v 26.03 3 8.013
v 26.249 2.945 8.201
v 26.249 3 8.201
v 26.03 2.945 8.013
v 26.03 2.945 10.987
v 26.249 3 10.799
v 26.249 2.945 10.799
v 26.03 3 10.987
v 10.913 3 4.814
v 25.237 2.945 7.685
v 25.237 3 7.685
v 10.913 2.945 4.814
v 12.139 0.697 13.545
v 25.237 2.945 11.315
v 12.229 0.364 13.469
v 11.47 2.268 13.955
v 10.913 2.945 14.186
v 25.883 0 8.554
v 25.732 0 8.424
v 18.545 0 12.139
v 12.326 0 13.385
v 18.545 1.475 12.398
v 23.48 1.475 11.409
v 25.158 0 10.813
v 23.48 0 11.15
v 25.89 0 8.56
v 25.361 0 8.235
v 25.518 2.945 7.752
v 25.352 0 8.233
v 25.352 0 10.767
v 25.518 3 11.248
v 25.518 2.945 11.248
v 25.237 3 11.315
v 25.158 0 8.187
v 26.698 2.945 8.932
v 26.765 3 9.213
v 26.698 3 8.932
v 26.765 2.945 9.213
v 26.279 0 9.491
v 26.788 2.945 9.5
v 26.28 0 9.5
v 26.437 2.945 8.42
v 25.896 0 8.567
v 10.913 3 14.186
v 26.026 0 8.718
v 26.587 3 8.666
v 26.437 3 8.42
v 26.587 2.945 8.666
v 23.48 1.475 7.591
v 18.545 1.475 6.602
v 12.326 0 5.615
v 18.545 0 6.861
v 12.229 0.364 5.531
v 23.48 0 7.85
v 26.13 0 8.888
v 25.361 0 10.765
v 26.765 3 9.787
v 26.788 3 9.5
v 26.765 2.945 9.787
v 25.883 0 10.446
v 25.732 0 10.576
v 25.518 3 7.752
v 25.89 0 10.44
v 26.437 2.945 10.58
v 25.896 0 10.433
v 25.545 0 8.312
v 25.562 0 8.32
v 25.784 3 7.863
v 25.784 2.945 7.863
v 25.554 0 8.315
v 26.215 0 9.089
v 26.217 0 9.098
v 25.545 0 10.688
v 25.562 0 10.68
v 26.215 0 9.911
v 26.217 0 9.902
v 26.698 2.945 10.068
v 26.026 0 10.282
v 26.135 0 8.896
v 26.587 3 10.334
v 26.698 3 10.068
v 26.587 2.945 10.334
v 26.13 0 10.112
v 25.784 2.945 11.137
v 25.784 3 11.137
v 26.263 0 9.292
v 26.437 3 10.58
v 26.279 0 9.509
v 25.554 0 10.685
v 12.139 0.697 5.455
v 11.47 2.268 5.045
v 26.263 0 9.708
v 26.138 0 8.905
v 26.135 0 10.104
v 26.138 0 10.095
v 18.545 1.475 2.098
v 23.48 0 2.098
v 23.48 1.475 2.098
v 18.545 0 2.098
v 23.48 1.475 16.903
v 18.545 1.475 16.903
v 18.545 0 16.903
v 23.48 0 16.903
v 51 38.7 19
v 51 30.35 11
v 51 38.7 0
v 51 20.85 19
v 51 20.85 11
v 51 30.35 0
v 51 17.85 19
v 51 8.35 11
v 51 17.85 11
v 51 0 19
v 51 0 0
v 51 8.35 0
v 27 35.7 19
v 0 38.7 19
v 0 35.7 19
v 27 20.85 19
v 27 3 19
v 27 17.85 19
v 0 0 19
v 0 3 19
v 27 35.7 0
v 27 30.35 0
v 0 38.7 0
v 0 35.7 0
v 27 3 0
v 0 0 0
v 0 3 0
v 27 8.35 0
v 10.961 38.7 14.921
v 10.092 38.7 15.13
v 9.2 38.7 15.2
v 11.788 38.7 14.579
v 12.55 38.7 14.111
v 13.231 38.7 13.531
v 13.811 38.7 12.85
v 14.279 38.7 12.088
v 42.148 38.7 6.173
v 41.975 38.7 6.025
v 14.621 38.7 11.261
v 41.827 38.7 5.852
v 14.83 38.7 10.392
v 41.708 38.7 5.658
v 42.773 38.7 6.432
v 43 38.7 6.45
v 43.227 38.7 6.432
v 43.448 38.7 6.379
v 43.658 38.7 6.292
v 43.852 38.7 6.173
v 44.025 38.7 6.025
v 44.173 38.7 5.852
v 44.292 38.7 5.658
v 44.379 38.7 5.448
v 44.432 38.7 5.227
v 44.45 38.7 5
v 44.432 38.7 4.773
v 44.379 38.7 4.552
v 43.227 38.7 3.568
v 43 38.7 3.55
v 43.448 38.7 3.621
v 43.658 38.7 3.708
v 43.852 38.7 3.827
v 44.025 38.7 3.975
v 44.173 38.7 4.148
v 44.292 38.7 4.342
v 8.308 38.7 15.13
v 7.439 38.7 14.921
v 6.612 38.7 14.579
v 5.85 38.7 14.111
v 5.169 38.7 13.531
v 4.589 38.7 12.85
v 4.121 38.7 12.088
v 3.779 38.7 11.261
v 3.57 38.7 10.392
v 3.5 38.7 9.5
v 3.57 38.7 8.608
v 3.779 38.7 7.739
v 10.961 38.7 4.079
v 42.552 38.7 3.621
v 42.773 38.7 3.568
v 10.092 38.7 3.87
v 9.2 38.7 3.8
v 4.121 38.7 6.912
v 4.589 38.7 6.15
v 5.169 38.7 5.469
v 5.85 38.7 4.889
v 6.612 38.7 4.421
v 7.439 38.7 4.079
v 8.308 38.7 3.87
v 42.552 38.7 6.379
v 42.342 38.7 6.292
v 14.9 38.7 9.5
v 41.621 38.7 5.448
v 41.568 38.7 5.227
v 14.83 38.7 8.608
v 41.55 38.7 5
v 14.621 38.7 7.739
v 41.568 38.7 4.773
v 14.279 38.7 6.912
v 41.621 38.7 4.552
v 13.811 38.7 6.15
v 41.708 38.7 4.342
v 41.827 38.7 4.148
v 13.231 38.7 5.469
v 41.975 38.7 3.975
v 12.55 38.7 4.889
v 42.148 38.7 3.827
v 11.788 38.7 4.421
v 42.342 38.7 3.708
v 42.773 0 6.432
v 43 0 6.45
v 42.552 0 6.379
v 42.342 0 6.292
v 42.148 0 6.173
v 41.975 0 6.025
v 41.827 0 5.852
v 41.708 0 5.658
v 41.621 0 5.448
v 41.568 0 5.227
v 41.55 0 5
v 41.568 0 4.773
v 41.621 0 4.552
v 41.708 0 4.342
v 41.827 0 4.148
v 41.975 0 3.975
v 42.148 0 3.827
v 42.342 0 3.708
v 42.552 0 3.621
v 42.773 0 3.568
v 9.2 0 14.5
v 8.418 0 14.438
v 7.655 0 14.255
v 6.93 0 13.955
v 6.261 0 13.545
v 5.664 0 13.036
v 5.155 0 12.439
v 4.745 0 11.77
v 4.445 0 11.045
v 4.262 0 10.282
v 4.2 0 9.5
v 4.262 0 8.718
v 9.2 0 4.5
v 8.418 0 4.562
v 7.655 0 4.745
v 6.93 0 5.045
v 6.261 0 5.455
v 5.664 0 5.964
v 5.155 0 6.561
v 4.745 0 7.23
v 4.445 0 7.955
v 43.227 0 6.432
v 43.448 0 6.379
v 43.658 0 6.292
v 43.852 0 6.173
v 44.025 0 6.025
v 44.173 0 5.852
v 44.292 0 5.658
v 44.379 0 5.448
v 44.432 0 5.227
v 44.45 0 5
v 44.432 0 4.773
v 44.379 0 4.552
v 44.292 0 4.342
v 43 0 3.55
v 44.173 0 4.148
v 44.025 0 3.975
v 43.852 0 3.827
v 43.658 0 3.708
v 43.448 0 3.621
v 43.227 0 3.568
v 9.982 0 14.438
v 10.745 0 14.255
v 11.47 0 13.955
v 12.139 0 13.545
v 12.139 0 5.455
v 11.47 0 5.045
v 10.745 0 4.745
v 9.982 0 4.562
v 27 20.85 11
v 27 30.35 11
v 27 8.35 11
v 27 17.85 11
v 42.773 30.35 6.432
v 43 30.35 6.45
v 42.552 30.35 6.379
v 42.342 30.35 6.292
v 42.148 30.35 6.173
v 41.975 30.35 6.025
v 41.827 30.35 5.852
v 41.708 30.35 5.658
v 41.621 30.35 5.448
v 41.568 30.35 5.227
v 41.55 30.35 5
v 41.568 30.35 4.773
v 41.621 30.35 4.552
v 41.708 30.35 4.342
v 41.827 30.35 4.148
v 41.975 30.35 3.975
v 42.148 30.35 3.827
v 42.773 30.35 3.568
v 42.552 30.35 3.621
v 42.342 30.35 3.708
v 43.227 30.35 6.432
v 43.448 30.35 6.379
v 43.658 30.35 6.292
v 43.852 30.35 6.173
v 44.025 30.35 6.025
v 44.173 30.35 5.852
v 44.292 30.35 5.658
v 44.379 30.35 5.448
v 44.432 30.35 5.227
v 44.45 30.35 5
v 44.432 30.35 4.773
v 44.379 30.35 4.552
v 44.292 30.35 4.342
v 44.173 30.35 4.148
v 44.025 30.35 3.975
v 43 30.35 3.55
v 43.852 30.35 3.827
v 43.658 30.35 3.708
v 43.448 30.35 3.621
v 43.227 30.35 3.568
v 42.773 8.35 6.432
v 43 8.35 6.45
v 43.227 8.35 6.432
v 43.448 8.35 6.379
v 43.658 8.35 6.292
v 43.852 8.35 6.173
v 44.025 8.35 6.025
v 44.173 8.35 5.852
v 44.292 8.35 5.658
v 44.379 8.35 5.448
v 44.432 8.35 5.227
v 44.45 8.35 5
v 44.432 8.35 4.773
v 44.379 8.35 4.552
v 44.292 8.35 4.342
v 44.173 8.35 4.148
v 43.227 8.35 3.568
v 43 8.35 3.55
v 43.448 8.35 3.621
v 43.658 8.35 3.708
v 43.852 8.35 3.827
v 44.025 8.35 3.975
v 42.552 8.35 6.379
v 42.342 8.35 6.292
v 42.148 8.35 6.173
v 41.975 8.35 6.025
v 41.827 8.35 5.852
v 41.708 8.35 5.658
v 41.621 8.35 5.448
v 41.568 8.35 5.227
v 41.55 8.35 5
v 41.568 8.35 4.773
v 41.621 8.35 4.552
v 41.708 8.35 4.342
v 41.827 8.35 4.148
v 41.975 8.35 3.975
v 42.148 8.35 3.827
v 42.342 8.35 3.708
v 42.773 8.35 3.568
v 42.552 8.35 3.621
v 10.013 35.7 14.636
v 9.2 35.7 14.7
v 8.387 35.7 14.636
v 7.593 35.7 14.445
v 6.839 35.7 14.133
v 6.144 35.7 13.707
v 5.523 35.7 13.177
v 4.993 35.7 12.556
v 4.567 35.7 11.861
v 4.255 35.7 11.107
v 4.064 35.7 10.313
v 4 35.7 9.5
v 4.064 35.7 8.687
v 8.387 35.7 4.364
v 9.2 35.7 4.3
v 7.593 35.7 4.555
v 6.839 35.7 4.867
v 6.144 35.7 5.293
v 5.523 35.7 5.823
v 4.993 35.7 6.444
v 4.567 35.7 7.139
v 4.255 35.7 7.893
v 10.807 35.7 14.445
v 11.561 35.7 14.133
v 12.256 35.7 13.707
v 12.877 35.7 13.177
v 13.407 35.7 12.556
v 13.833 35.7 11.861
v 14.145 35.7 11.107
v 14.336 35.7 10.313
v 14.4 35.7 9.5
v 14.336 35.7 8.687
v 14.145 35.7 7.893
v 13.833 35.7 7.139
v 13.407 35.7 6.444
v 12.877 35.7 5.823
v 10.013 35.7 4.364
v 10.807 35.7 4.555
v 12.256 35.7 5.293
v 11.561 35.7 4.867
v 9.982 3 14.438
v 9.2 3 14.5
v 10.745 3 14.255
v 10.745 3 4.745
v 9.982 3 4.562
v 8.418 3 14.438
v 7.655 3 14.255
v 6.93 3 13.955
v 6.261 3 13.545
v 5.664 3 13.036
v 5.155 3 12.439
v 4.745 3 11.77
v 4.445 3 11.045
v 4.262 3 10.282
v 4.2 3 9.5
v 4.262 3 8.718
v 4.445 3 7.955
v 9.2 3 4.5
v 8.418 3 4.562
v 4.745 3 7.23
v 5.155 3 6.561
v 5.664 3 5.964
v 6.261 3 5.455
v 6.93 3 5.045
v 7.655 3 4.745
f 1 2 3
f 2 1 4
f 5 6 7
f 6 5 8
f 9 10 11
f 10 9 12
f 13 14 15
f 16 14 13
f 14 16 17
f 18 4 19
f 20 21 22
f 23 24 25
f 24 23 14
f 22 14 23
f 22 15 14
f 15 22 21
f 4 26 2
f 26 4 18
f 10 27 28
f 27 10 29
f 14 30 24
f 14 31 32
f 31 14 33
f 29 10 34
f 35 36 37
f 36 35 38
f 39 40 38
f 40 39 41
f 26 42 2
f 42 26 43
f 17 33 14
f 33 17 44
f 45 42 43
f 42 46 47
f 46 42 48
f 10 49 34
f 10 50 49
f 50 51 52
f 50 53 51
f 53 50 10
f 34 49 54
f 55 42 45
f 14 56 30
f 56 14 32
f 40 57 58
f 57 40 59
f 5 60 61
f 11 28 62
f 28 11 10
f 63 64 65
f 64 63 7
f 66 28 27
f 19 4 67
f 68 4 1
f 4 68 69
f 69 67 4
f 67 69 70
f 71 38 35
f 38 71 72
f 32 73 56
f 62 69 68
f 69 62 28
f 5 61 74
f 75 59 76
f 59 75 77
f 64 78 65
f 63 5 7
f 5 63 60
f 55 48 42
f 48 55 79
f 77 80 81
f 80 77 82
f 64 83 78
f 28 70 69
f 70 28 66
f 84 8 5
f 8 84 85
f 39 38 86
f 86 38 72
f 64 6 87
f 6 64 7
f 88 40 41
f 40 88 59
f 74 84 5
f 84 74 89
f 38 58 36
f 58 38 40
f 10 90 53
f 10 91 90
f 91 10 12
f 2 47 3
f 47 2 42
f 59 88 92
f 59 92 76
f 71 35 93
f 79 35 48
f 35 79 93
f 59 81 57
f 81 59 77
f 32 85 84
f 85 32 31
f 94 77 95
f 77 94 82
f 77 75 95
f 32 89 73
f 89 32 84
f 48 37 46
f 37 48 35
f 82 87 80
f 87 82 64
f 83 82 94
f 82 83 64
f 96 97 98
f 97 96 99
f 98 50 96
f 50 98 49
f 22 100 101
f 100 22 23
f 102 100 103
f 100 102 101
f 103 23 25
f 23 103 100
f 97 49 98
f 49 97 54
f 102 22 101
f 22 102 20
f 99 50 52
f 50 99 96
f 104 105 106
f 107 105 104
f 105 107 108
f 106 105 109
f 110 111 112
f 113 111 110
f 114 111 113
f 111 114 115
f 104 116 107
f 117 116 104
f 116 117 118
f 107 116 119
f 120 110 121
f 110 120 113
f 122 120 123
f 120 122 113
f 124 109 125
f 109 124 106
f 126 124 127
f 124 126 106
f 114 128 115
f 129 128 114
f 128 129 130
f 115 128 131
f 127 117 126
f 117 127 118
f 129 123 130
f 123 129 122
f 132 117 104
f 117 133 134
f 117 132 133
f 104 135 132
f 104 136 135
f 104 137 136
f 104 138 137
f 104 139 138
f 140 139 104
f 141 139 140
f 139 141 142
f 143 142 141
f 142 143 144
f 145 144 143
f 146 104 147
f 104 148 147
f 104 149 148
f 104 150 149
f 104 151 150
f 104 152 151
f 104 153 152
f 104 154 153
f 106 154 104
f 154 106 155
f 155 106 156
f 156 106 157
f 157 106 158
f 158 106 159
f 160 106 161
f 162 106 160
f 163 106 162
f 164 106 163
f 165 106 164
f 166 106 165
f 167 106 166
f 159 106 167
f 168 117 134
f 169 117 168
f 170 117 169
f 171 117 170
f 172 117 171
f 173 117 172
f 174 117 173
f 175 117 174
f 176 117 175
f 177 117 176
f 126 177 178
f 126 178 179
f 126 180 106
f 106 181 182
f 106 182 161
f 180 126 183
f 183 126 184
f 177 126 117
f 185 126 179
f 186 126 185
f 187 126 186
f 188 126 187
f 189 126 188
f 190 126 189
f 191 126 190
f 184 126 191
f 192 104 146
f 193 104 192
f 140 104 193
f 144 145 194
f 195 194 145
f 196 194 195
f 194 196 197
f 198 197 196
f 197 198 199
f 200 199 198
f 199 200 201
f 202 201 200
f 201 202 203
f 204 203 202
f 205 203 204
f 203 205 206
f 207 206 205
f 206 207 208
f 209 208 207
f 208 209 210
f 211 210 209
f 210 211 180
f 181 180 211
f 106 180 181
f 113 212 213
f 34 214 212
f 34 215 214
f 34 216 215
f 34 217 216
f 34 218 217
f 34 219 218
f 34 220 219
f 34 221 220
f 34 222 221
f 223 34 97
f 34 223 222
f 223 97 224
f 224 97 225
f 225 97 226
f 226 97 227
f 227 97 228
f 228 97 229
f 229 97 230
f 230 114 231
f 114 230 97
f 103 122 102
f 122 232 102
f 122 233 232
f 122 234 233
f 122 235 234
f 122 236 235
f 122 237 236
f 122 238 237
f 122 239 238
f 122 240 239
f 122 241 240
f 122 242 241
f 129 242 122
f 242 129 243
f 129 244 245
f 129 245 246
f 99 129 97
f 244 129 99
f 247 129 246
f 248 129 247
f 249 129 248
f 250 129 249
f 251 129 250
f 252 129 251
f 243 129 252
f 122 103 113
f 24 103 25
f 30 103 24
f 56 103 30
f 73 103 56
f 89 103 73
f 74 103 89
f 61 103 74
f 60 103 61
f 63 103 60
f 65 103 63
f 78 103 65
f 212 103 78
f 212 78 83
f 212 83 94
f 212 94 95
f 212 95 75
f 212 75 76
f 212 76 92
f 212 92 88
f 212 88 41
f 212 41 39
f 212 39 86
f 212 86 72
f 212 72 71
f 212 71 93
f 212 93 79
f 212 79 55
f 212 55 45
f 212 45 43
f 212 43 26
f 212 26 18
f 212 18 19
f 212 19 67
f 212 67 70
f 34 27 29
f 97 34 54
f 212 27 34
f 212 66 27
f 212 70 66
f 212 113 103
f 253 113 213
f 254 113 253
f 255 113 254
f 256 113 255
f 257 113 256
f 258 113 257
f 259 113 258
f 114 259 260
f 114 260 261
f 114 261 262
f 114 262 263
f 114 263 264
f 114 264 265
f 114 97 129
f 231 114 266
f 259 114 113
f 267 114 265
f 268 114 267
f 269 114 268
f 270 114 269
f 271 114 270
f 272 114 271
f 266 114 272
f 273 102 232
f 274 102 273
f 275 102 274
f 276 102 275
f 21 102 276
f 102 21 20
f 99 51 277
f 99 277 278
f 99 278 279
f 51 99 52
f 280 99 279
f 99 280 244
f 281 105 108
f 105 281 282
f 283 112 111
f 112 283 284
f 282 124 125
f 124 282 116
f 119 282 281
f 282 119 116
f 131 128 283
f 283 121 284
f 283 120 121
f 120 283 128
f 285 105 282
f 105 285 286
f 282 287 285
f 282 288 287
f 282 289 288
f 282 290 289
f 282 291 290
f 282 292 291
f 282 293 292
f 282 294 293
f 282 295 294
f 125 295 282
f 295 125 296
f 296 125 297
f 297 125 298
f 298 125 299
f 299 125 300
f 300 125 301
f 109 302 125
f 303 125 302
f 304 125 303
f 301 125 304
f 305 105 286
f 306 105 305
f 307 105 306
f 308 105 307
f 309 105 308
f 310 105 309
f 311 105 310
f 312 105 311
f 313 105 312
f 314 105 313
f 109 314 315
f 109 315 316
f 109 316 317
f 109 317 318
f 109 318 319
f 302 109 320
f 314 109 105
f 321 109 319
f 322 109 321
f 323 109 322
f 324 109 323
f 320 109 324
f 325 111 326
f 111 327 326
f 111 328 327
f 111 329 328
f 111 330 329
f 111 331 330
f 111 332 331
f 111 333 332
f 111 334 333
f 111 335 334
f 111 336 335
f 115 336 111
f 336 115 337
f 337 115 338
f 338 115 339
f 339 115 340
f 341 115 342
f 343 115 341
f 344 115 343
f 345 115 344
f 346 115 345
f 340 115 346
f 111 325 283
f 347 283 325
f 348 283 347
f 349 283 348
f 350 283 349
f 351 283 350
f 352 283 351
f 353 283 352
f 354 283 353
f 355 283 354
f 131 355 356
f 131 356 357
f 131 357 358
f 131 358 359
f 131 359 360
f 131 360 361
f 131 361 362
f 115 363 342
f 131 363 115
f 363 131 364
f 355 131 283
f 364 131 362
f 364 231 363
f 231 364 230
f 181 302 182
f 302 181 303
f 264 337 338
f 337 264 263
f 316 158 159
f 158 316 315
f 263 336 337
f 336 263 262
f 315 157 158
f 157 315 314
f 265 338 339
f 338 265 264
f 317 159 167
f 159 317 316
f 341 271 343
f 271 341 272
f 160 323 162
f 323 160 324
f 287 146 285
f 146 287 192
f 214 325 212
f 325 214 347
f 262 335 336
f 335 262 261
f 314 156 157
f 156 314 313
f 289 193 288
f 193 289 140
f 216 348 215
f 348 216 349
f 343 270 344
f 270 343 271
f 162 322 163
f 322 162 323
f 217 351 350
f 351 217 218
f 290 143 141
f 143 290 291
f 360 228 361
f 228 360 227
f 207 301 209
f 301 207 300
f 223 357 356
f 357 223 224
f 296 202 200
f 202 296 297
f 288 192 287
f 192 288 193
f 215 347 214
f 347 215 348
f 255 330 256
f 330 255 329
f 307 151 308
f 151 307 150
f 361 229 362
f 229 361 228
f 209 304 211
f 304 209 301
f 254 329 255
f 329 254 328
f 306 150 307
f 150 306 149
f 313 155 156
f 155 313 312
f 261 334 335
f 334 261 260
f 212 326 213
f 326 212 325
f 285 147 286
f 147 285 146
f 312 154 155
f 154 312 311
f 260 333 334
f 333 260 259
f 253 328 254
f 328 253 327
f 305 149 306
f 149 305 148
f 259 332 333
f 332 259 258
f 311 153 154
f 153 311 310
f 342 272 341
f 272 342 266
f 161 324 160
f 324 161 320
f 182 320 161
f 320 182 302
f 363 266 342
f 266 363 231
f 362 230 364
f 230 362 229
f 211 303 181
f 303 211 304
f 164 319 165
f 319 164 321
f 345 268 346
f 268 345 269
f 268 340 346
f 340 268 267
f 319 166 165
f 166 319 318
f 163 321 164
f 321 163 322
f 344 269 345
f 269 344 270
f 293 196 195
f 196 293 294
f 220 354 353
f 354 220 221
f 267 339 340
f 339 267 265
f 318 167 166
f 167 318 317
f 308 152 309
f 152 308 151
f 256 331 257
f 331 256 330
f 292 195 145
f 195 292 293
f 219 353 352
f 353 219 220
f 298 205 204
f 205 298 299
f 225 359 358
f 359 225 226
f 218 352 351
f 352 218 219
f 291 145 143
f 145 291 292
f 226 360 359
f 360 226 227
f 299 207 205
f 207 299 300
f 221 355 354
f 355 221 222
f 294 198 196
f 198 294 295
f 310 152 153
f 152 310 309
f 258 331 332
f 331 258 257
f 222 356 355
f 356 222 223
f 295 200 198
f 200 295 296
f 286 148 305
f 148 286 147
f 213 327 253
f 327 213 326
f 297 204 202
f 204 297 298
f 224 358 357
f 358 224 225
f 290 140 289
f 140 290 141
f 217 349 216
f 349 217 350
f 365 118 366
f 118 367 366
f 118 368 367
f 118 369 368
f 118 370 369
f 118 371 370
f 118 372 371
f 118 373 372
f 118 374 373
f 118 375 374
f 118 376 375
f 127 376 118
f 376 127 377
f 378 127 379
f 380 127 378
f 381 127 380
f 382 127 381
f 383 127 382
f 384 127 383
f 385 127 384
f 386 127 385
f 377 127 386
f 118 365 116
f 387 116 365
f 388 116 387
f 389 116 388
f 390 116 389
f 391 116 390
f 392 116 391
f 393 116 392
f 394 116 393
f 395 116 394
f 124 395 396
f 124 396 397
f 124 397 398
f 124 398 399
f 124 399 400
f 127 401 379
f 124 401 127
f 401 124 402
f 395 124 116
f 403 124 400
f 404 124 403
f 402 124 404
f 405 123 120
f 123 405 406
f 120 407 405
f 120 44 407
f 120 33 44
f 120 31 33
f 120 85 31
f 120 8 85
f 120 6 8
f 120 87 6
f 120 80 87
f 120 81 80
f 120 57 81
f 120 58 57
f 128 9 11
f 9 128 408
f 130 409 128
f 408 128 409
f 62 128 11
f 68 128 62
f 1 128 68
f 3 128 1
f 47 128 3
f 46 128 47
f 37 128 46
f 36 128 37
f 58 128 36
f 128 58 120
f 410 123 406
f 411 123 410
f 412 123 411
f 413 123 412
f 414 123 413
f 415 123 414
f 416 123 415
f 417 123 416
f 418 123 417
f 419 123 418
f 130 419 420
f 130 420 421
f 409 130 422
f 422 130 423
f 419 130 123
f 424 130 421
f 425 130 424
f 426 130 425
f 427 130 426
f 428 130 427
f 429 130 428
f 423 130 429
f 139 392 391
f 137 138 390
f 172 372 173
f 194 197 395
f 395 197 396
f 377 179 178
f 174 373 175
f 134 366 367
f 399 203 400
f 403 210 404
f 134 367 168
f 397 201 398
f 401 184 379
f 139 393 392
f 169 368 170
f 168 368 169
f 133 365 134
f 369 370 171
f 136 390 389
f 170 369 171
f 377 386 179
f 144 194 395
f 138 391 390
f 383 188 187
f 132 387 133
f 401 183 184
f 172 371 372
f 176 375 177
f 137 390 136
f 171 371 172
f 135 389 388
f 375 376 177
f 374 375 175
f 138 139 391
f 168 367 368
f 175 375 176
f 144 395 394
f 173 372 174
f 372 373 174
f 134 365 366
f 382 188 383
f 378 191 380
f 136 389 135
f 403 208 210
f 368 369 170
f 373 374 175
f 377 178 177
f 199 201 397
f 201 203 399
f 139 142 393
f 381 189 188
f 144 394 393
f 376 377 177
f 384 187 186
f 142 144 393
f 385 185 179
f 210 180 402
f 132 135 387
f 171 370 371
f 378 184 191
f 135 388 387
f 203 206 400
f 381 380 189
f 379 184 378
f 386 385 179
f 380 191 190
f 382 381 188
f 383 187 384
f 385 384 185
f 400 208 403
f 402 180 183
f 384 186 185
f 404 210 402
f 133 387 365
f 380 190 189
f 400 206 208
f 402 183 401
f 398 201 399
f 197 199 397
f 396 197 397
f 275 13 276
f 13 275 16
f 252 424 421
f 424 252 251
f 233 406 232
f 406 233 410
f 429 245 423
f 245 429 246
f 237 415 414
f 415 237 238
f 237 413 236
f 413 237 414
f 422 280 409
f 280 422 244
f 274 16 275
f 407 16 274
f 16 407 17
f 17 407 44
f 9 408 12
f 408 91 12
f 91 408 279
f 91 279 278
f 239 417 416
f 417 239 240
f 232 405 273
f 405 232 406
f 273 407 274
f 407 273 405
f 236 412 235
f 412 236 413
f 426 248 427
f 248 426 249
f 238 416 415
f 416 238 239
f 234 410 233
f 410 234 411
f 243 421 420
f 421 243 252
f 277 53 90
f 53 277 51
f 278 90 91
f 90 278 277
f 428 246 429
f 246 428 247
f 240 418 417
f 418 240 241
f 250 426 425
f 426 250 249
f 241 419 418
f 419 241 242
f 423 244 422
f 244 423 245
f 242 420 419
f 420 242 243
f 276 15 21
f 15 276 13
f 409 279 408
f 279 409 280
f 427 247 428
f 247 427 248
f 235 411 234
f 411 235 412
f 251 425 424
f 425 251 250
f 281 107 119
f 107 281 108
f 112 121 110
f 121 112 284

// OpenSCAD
// file: servo_arm.scad
/**
 *  Parametric servo arm generator for OpenScad
 *  Générateur de palonnier de servo pour OpenScad
 *
 *  Copyright (c) 2012 Charles Rincheval.  All rights reserved.
 *
 *  This library is free software; you can redistribute it and/or
 *  modify it under the terms of the GNU Lesser General Public
 *  License as published by the Free Software Foundation; either
 *  version 2.1 of the License, or (at your option) any later version.
 *
 *  This library is distributed in the hope that it will be useful,
 *  but WITHOUT ANY WARRANTY; without even the implied warranty of
 *  MERCHANTABILITY or FITNESS FOR A PARTICULAR PURPOSE.  See the GNU
 *  Lesser General Public License for more details.
 *
 *  You should have received a copy of the GNU Lesser General Public
 *  License along with this library; if not, write to the Free Software
 *  Foundation, Inc., 51 Franklin St, Fifth Floor, Boston, MA  02110-1301  USA
 *
 *  Last update :
 *  https://github.com/hugokernel/OpenSCAD_ServoArms
 *
 *  http://www.digitalspirit.org/
 */

arm_length = 20;

arm_count = 4; // [1,2,3,4,5,6,7,8]

//  Clear between arm head and servo head (PLA: 0.3, ABS 0.2)
SERVO_HEAD_CLEAR = 0.2; // [0.2,0.3,0.4,0.5]

$fn = 40 / 1;

/**
 *  Head / Tooth parameters
 *  Futaba 3F Standard Spline
 *  http://www.servocity.com/html/futaba_servo_splines.html
 *
 *  First array (head related) :
 *  0. Head external diameter
 *  1. Head heigth
 *  2. Head thickness
 *  3. Head screw diameter
 *
 *  Second array (tooth related) :
 *  0. Tooth count
 *  1. Tooth height
 *  2. Tooth length
 *  3. Tooth width
 */
FUTABA_3F_SPLINE = [
    [5.92, 4, 1.1, 2.5],
    [25, 0.3, 0.7, 0.1]
];

module servo_futaba_3f(length, count) {
    servo_arm(FUTABA_3F_SPLINE, [length, count]);
}

/**
 *  If you want to support a new servo, juste add a new spline definition array
 *  and a module named like servo_XXX_YYY where XXX is servo brand and YYY is the
 *  connection type (3f) or the servo type (s3003)
 */

module servo_standard(length, count) {
    servo_futaba_3f(length, count);
}

/**
 *  Tooth
 *
 *    |<-w->|
 *    |_____|___
 *    /     \  ^h
 *  _/       \_v
 *   |<--l-->|
 *
 *  - tooth length (l)
 *  - tooth width (w)
 *  - tooth height (h)
 *  - height
 *
 */
module servo_head_tooth(length, width, height, head_height) {
    linear_extrude(height = head_height) {
        polygon([[-length / 2, 0], [-width / 2, height], [width / 2, height], [length / 2,0]]);
    }
}

/**
 *  Servo head
 */
module servo_head(params, clear = SERVO_HEAD_CLEAR) {

    head = params[0];
    tooth = params[1];

    head_diameter = head[0];
    head_heigth = head[1];

    tooth_count = tooth[0];
    tooth_height = tooth[1];
    tooth_length = tooth[2];
    tooth_width = tooth[3];

    % cylinder(r = head_diameter / 2, h = head_heigth + 1);

    cylinder(r = head_diameter / 2 - tooth_height + 0.03 + clear, h = head_heigth);

    for (i = [0 : tooth_count]) {
        rotate([0, 0, i * (360 / tooth_count)]) {
            translate([0, head_diameter / 2 - tooth_height + clear, 0]) {
                servo_head_tooth(tooth_length, tooth_width, tooth_height, head_heigth);
            }
        }
    }
}

/**
 *  Servo hold
 *  - Head / Tooth parameters
 *  - Arms params (length and count)
 */
module servo_arm(params, arms) {

    head = params[0];
    tooth = params[1];

    head_diameter = head[0];
    head_heigth = head[1];
    head_thickness = head[2];
    head_screw_diameter = head[3];

    tooth_length = tooth[2];
    tooth_width = tooth[3];

    arm_length = arms[0];
    arm_count = arms[1];

    /**
     *  Servo arm
     *  - length is from center to last hole
     */
    module arm(tooth_length, tooth_width, head_height, head_heigth, hole_count = 1) {

        arm_screw_diameter = 2;

        difference() {
            union() {
                cylinder(r = tooth_width / 2, h = head_heigth);

                linear_extrude(height = head_heigth) {
                    polygon([
                        [-tooth_width / 2, 0], [-tooth_width / 3, tooth_length],
                        [tooth_width / 3, tooth_length], [tooth_width / 2, 0]
                    ]);
                }

                translate([0, tooth_length, 0]) {
                    cylinder(r = tooth_width / 3, h = head_heigth);
                }

                if (tooth_length >= 12) {
                    translate([-head_heigth / 2 + 2, 3.8, -4]) {
                        rotate([90, 0, 0]) {
                            rotate([0, -90, 0]) {
                                linear_extrude(height = head_heigth) {
                                    polygon([
                                        [-tooth_length / 1.7, 4], [0, 4], [0, - head_height + 5],
                                        [-2, - head_height + 5]
                                    ]);
                                }
                            }
                        }
                    }
                }
            }

            // Hole
            for (i = [0 : hole_count - 1]) {
                //translate([0, length - (length / hole_count * i), -1]) {
                translate([0, tooth_length - (4 * i), -1]) {
                    cylinder(r = arm_screw_diameter / 2, h = 10);
                }
            }

            cylinder(r = head_screw_diameter / 2, h = 10);
        }
    }

    difference() {
        translate([0, 0, 0.1]) {
            cylinder(r = head_diameter / 2 + head_thickness, h = head_heigth + 1);
        }

        cylinder(r = head_screw_diameter / 2, h = 10);

        servo_head(params);
    }

    arm_thickness = head_thickness;

    // Arm
    translate([0, 0, head_heigth]) {
        for (i = [0 : arm_count - 1]) {
            rotate([0, 0, i * (360 / arm_count)]) {
                arm(arm_length, head_diameter + arm_thickness * 2, head_heigth, 2);
            }
        }
    }
}

module demo() {
    rotate([0, 180, 0])
        servo_standard(arm_length, arm_count);
}

//demo();
//servo_standard(arm_length, 1);
// main file
$fn=128;

include <servo_arm.scad>;

//Servo actuator joint
//TODO: Cleanly break out user variables

Servo_Base_X=24;
Servo_Base_Y=13;
Servo_Base_Z=5.5;
Servo_Gear=5/2;
Servo_Height=32.7; //Alter this with total Servo Height
//Servo_ToMount=(4.4)+15.8; //Alter this last amt to adj servo height //Blue Plastic
Servo_ToMount=(4.4)+18.6; //Alter this last amt to adj servo height //Metal
Connector_Width=10;
Connector_Height=4;
Height_To_Wire=5.5;
Servo_Screw_Offset=2;
Servo_Mount_Screw_Rad=1.9/2;
Servo_Mount_Screw_Height=10;
Depth_To_Cog=10;

M3_HeadHeight=3;
M3_HeadDia=5.75;
M3_Length=[7, 8.75, 14.61, 17, 17.75, 19, 22.79, 25.21, 32.75];
M3_ScrewDia=2.9;

//Arm
Servo_Arm_Gear_Dia=7.5;
Servo_Arm_Tip_Dia=3.5;
Servo_Arm_Length=15;
Arm_Thickness=3;
Arm_Width=(Servo_Base_X+9)*2+Servo_Height+5;
Servo_Arm_Plus_Length=10;
Servo_Arm_Plus_Width=4;
Servo_Arm_Offset=-2;
echo("Arm Width: ", Arm_Width);

Clip_Allowance=.5;

//servo head
FUTABA_3F_SPLINE = [
    [4.7, 4, 1.1, 2.5],
    [20, 0.3, 0.7, 0.1]
];

module ServoHead() {
    head_round=FUTABA_3F_SPLINE[0][0];
    difference() {
        union() {
            difference() {
                //servo spline match
                cylinder(r=head_round, h=7-Arm_Thickness);
                servo_head(FUTABA_3F_SPLINE);
            }
            hull() {
                hull() {
                    translate([0,0,7-Arm_Thickness]) cylinder(r=head_round, h=.1);
                    translate([0,Servo_Arm_Length, 7-Arm_Thickness]) cylinder(r=Servo_Arm_Tip_Dia/2, h=.1);
                }
                hull() {
                    translate([0,0,7-0.1]) cylinder(r=head_round-.5, h=.1);
                    translate([0,Servo_Arm_Length, 7-0.1]) cylinder(r=Servo_Arm_Tip_Dia/2-.5, h=.1);
                }
            }
            translate([0,Servo_Arm_Length*.75,7-.75]) cube([head_round*3, head_round, 1.5], center=true); 
        }
        cylinder(r=1.5, h=7);
        translate([0,0,7-1.5]) cylinder(r=3, h=7);
    }
}

module MountClip() {
    difference() {
        cube([Servo_Base_X+14, Servo_Base_Y+12, Servo_ToMount-4.4]);
        difference() {
            //take out the servo-seat
            translate([2-.4, (Servo_Base_Y+12)/2-(Servo_Base_Y+4+Clip_Allowance)/2, 0]) cube([Servo_Base_X+10+Clip_Allowance, Servo_Base_Y+4+Clip_Allowance, Servo_ToMount-4+Clip_Allowance]);
            //some side knotches for stability
            echo ((Servo_Base_Y+12)/2+(Servo_Base_Y+4+Clip_Allowance)/2-1);
            translate([((Servo_Base_X+11+Clip_Allowance*2)/3)+2-Clip_Allowance, (Servo_Base_Y+12)/2+(Servo_Base_Y+4+Clip_Allowance)/2-1, 0]) cube([((Servo_Base_X+10)/3)-Clip_Allowance*2, 1, Servo_ToMount-6-Clip_Allowance*2]);
            translate([((Servo_Base_X+11+Clip_Allowance*2)/3)+(2-Clip_Allowance), (Servo_Base_Y+12)/2-(Servo_Base_Y+4+Clip_Allowance)/2 , 0]) cube([((Servo_Base_X+10)/3)-Clip_Allowance*2, 1, Servo_ToMount-6-Clip_Allowance*2]);
        }
        //Open up the front
        translate([0, (Servo_Base_Y+12)/2-(Servo_Base_Y+4+Clip_Allowance-4)/2, 0]) cube([2, Servo_Base_Y+4+Clip_Allowance-4, Servo_ToMount-4+Clip_Allowance]);
        //screw Holes
        translate([4.5, Servo_Base_Y+12+Clip_Allowance, Servo_ToMount-8]) rotate([-90,0,0]) M3Screw(0);
        translate([4.5, -Clip_Allowance, Servo_ToMount-8]) rotate([90,0,0]) M3Screw(0);
        translate([Servo_Base_X+9-M3_ScrewDia/2-1+2-.4,Servo_Base_Y+12+Clip_Allowance, 7-4]) rotate([-90,0,0]) M3Screw(0);
        translate([Servo_Base_X+9-M3_ScrewDia/2-1+2-Clip_Allowance,-Clip_Allowance, 7-4]) rotate([90,0,0]) M3Screw(0);
    }
}

module M3Screw(num) {
    translate([0,0,-M3_Length[num]]) union() {
        translate([0,0,M3_Length[num]-M3_HeadHeight]) cylinder(r=M3_HeadDia/2, h=M3_HeadHeight);
        translate([0,0,0]) cylinder(r=M3_ScrewDia/2, h=M3_Length[num]);
    }
}

module MountBox() { 
    difference() {
        cube([Servo_Base_X+9, Servo_Base_Y+4, Servo_Height+6]);
        //take the middle out to fix servo
        hull() {
            translate([5,2,Servo_Height-2]) cube([Servo_Base_X, Servo_Base_Y, 2]);
            translate([5,2,3]) cube([Servo_Base_X-1, Servo_Base_Y, 2]);
        }
        //Take the top off
        translate([0,0,Servo_ToMount]) cube([Servo_Base_X+10, Servo_Base_Y+4, Servo_Height+6]);
        //remove some sides
        translate([((Servo_Base_X+10)/3), 0, 3]) cube([((Servo_Base_X+10)/3), 3, Servo_ToMount-6]);
        translate([((Servo_Base_X+10)/3), Servo_Base_Y+2, 3]) cube([((Servo_Base_X+10)/3), 3, Servo_ToMount-6]);
        //connector sleeve
        translate([0, (((Servo_Base_Y+4)/2)-(Connector_Width/2)), Height_To_Wire+(Connector_Height/2)]) cube([5, Connector_Width, Connector_Height]);
        //Screws
        translate([Servo_Screw_Offset+.5, ((Servo_Base_Y+4)/2), Servo_ToMount-Servo_Mount_Screw_Height]) cylinder(r=Servo_Mount_Screw_Rad, h=Servo_Mount_Screw_Height);
        translate([Servo_Screw_Offset+Servo_Base_X+5-.5, ((Servo_Base_Y+4)/2), Servo_ToMount-Servo_Mount_Screw_Height]) cylinder(r=Servo_Mount_Screw_Rad, h=Servo_Mount_Screw_Height);
        //Blow out the bottom
        translate([4.9,0,0]) cube([Servo_Base_X+.2, Servo_Base_Y+4, 4]);
        translate([0,(Servo_Base_Y+4)/2-(Servo_Base_Y-4)/2,0]) cube([Servo_Base_X+10, Servo_Base_Y-4, 4]);
        //screw Holes
        translate([2.5, (Servo_Base_Y+4)/2, 3]) cylinder(r=M3_ScrewDia/2, h=M3_Length[0]-M3_HeadHeight);
        translate([5+Servo_Base_X+1.5, (Servo_Base_Y+4)/2, 3]) cylinder(r=M3_ScrewDia/2, h=M3_Length[0]-M3_HeadHeight);
        //Allow for insertion with cable
        translate([4, (((Servo_Base_Y+4)/2)-(Connector_Width/2)), Height_To_Wire+(Connector_Height/2)]) cube([1, Connector_Width, 20]);
        
        //Side Mounts // - Left -> Right - Upper -> Lower
        translate([2.5, 0, Servo_ToMount-4]) rotate([-90,0,0]) cylinder(r=M3_ScrewDia/2, h=M3_Length[0]);
        translate([2.5, Servo_Base_Y+4, Servo_ToMount-4]) rotate([90,0,0]) cylinder(r=M3_ScrewDia/2, h=M3_Length[0]);
        translate([Servo_Base_X+9-M3_ScrewDia/2-1, 0, 7]) rotate([-90,0,0]) cylinder(r=M3_ScrewDia/2, h=M3_Length[0]);
        translate([Servo_Base_X+9-M3_ScrewDia/2-1, Servo_Base_Y+4, 7]) rotate([90,0,0]) cylinder(r=M3_ScrewDia/2, h=M3_Length[0]);
    }
}

module MountBase() {
    difference() {
        union() {
            cube([Servo_Base_X+9, Servo_Base_Y+4, 4]);
            translate([5+Servo_Base_Y/2, 2+Servo_Base_Y/2, 4]) cylinder(r1=Servo_Base_Y/2-1.5, r2=Servo_Base_Y/2-1, h=3);
            translate([5+Servo_Base_Y/2, 2+Servo_Base_Y/2,7]) scale([1,1,.3]) sphere(r=Servo_Base_Y/2-1);
        }
        //Screw Holes
        translate([2.5, 2+Servo_Base_Y/2, 1]) rotate([0,0,0]) cylinder(r=M3_HeadDia/2, h=M3_HeadHeight*2);
        translate([5+Servo_Base_X+1.5, 2+Servo_Base_Y/2, 1]) rotate([0,0,0]) cylinder(r=M3_HeadDia/2, h=M3_HeadHeight*2);
        
        translate([2.5, 2+Servo_Base_Y/2, 0]) rotate([0,0,0]) cylinder(r=M3_ScrewDia/2, h=1);
        translate([5+Servo_Base_X+1.5, 2+Servo_Base_Y/2, 0]) rotate([0,0,0]) cylinder(r=M3_ScrewDia/2, h=1);
        
        //corners
        translate([0,Servo_Base_Y-.4,0]) cube([5,4+.4,4]);
        translate([5+Servo_Base_X,0,0]) cube([5,4+.4,4]);
        translate([5+Servo_Base_X,Servo_Base_Y-.4,0]) cube([5,4+.4,4]);
        translate([0,0,0]) cube([5,4+.4,4]);
    }
}

module ServoArm() { //TODO: 1. Move the Arm Hull to it's own module. 2. provide for all 3 kinds of servo arms.
    difference() {
        union() {
            //Horizontal member
            cube([Arm_Width, Servo_Base_Y+6, Arm_Thickness]);
            translate([0, (Servo_Base_Y+6)/2, 0]) cylinder(r=(Servo_Base_Y+6)/2, h=Arm_Thickness); 
            translate([Arm_Width, (Servo_Base_Y+6)/2, 0]) cylinder(r=(Servo_Base_Y+6)/2, h=Arm_Thickness);
            //Vertical Member
            translate([((Arm_Width)/2)-(Servo_Base_Y+6)/2, -(((Arm_Width)/2)-((Servo_Base_Y+6)/2)), 0]) cube([Servo_Base_Y+6, Arm_Width, 3]);
            translate([Arm_Width/2, (Arm_Width/2)+((Servo_Base_Y+6)/2), 0]) cylinder(r=(Servo_Base_Y+6)/2, h=Arm_Thickness); 
            translate([Arm_Width/2, -((Arm_Width/2)-(Servo_Base_Y+6)/2), 0]) cylinder(r=(Servo_Base_Y+6)/2, h=Arm_Thickness);
        }
        //Actuiator Holes
        translate([0, Servo_Base_Y/2+3, 0]) cylinder(r1=Servo_Base_Y/2-1+.2,r2=Servo_Base_Y/2-1.5+.2, h=Arm_Thickness);
        translate([Arm_Width/2, (Arm_Width/2)+((Servo_Base_Y+6)/2), 0]) cylinder(r1=Servo_Base_Y/2-1.5+.2, r2=Servo_Base_Y/2-1+.2, h=Arm_Thickness);
        //Servo Arm form Horiz
        translate([Arm_Width-Servo_Arm_Offset, Servo_Base_Y/2+3,0]) cylinder(r=Servo_Arm_Gear_Dia/2, h=Arm_Thickness);
        translate([Arm_Width-Servo_Arm_Offset, Servo_Base_Y/2+3,7.21]) scale([1.05, 1.05, 1.05]) rotate([0,180,90]) ServoHead();
        /*
        hull() {
            translate([Arm_Width-Servo_Arm_Offset, Servo_Base_Y/2+3,0]) cylinder(r=Servo_Arm_Gear_Dia/2, h=Arm_Thickness-1.5);
            translate([Arm_Width-Servo_Arm_Length-Servo_Arm_Offset, Servo_Base_Y/2+3,0]) cylinder(r=Servo_Arm_Tip_Dia/2, h=Arm_Thickness-1.5);
        }
        */
        //Servo Arm form Vertical
        translate([Arm_Width/2, -((Arm_Width/2)-(Servo_Base_Y/2+3))+Servo_Arm_Offset,0]) cylinder(r=Servo_Arm_Gear_Dia/2, h=Arm_Thickness);
        translate([Arm_Width/2, -((Arm_Width/2)-(Servo_Base_Y/2+3))+Servo_Arm_Offset,Arm_Thickness-7.21]) scale([1.05, 1.05, 1.05]) ServoHead();
        /*
        hull() {
            translate([Arm_Width/2, -((Arm_Width/2)-(Servo_Base_Y/2+3))+Servo_Arm_Offset,Arm_Thickness-1.5]) cylinder(r=Servo_Arm_Gear_Dia/2, h=Arm_Thickness-1.5);
            translate([Arm_Width/2, -((Arm_Width/2)-(Servo_Base_Y/2+3)-Servo_Arm_Length)+Servo_Arm_Offset,Arm_Thickness-1.5]) cylinder(r=Servo_Arm_Tip_Dia/2, h=Arm_Thickness-1.5);
        }*/
        //Middle Plus
        translate([Arm_Width/2-Servo_Arm_Plus_Length/2, (Servo_Base_Y+6)/2-Servo_Arm_Plus_Width/2, 0]) cube([Servo_Arm_Plus_Length, Servo_Arm_Plus_Width, Arm_Thickness]);
        translate([Arm_Width/2-Servo_Arm_Plus_Width/2,(Servo_Base_Y+6)/2-Servo_Arm_Plus_Length/2, 0]) cube([Servo_Arm_Plus_Width, Servo_Arm_Plus_Length, Arm_Thickness]);
        //Wire Catch
        translate([Arm_Width/2+Servo_Arm_Plus_Length/2+2, (Servo_Base_Y+6)/2,0]) rotate([0,0,90]) WireCatch();
        translate([Arm_Width/2-Servo_Arm_Plus_Length/2-2, (Servo_Base_Y+6)/2,0]) rotate([0,0,-90]) WireCatch();
        translate([Arm_Width/2, (Servo_Base_Y+6)/2-Servo_Arm_Plus_Length/2-2, 0]) WireCatch();
        translate([Arm_Width/2, (Servo_Base_Y+6)/2+Servo_Arm_Plus_Length/2+2, 0]) rotate([0,0,180]) WireCatch();
    }
    module WireCatch() {
        translate([-1.6/2, 0, 0]) cylinder(r=1.8/2, h=Arm_Thickness);
        translate([0, 0, 0]) cylinder(r=1.8/2, h=Arm_Thickness);
        translate([1.6/2, 0, 0]) cylinder(r=1.8/2, h=Arm_Thickness);
        translate([0,1.6,Arm_Thickness/2]) cube([2,1.8,Arm_Thickness], center=true);
    }
}

module Mold() {
    difference() {
        minkowski() {
            cube([Servo_Height-4, (Servo_Base_Y+6)/2, Servo_Base_X+9-6]);
            rotate([90,0,0]) cylinder(r=3, h=(Servo_Base_Y+6)/2);
        }
        translate([-3, -(Servo_Base_Y+6)/2, Servo_Base_X+9-6]) cube([Servo_Height+8.5, Servo_Base_Y+6, 3]);
    }
    translate([(Servo_Height-4.4)/2-(Servo_Arm_Plus_Width-.4)/2, -(Servo_Arm_Plus_Length)/2, -6]) cube([Servo_Arm_Plus_Width-.4, Servo_Arm_Plus_Length-.4, Arm_Thickness]);
    translate([(Servo_Height-4.4)/2-(Servo_Arm_Plus_Length-.4)/2, -(Servo_Arm_Plus_Width)/2, -6]) cube([Servo_Arm_Plus_Length-.4, Servo_Arm_Plus_Width-.4, Arm_Thickness]);
}

module MountClip2Spring(spring_box_width, end_depth=10) {
    MountClip();
    end_depth=10;
    // clip base - cube([Servo_Base_X+14, Servo_Base_Y+12, Servo_ToMount-4.4]);
    difference() {
        translate([Servo_Base_X+14, 0,0]) cube([end_depth, Servo_Base_Y+12, Servo_ToMount-4.4]);
        translate([Servo_Base_X+14, ((Servo_Base_Y+12)/2-spring_box_width/2), 0]) cube([end_depth, spring_box_width, Servo_ToMount-4.4]);
        //screw holes
        translate([Servo_Base_X+14+end_depth/2, -2, Servo_ToMount-4.4-7.5]) rotate([90,0,0]) M3Screw(8);
    }
}

module Servo2Spring(spring_box_width) {
    distance=14;
    spring_screw=16;
    spring_end_height=24;
    end_depth=10; //from spring
    difference() {
        cube([distance+spring_end_height+(Servo_Base_Y), Servo_Height+(Arm_Thickness*2), Servo_Base_Y+6]);
        //take out the spring side
        translate([distance+(Servo_Base_Y), (Servo_Height+(Arm_Thickness*2))/2-(spring_box_width/2), 0]) cube([spring_end_height, spring_box_width, Servo_Base_Y+6-end_depth+2]);
        //take out the screw holes
        translate([distance+(Servo_Base_Y)+spring_screw, 0, end_depth/2]) rotate([270,0,0])cylinder(r=2.9/2, h=Servo_Height+(Arm_Thickness*2));
        //take out the servo area
        translate([0, Arm_Thickness, 0]) cube([Servo_Base_Y+distance, Servo_Height, Servo_Base_Y+6]);
        //Actuator Hole
        translate([4+(Servo_Base_Y/2-1.5+.2), Servo_Height+3, (Servo_Base_Y+6)/2]) rotate([270,0,0])cylinder(r1=Servo_Base_Y/2-1.5+.2, r2=Servo_Base_Y/2-1+.2, h=Arm_Thickness);
        //Servo Arm Hole
        translate([4+(Servo_Base_Y/2-1.5+.2), 7.25, (Servo_Base_Y+6)/2]) rotate([90,90,0]) scale([1.05, 1.05, 1.05]) ServoHead();
        //Remove Servo Arm Center
        translate([4+(Servo_Base_Y/2-1.5+.2), 0, (Servo_Base_Y+6)/2])rotate([270,0,0]) cylinder(r=5, h=Arm_Thickness+1);
        //Split in half
        translate([0, (Servo_Height+(Arm_Thickness*2))/2 - (Arm_Thickness)/2, 0]) cube([distance+spring_end_height+(Servo_Base_Y), Arm_Thickness, Servo_Base_Y+6]);
    }
}

Servo2Spring(22);
//M3Screw(0);
//MountBox();
//MountClip();
//translate([0, Servo_Base_Y+4, 4]) rotate([180,0,0]) MountBase();
//MountBase();
//ServoArm();
//translate([(Arm_Width/2)-(Servo_Height-.2)/2+.2, (Servo_Base_Y+6)/2+.2, 6]) Mold();
//Mold();
//ServoHead();
//MountClip2Spring(22, 10);
 //       translate([Servo_Base_X+14+10/2, -2, Servo_ToMount-4.4-7.5]) rotate([90,0,0]) M3Screw(8);
